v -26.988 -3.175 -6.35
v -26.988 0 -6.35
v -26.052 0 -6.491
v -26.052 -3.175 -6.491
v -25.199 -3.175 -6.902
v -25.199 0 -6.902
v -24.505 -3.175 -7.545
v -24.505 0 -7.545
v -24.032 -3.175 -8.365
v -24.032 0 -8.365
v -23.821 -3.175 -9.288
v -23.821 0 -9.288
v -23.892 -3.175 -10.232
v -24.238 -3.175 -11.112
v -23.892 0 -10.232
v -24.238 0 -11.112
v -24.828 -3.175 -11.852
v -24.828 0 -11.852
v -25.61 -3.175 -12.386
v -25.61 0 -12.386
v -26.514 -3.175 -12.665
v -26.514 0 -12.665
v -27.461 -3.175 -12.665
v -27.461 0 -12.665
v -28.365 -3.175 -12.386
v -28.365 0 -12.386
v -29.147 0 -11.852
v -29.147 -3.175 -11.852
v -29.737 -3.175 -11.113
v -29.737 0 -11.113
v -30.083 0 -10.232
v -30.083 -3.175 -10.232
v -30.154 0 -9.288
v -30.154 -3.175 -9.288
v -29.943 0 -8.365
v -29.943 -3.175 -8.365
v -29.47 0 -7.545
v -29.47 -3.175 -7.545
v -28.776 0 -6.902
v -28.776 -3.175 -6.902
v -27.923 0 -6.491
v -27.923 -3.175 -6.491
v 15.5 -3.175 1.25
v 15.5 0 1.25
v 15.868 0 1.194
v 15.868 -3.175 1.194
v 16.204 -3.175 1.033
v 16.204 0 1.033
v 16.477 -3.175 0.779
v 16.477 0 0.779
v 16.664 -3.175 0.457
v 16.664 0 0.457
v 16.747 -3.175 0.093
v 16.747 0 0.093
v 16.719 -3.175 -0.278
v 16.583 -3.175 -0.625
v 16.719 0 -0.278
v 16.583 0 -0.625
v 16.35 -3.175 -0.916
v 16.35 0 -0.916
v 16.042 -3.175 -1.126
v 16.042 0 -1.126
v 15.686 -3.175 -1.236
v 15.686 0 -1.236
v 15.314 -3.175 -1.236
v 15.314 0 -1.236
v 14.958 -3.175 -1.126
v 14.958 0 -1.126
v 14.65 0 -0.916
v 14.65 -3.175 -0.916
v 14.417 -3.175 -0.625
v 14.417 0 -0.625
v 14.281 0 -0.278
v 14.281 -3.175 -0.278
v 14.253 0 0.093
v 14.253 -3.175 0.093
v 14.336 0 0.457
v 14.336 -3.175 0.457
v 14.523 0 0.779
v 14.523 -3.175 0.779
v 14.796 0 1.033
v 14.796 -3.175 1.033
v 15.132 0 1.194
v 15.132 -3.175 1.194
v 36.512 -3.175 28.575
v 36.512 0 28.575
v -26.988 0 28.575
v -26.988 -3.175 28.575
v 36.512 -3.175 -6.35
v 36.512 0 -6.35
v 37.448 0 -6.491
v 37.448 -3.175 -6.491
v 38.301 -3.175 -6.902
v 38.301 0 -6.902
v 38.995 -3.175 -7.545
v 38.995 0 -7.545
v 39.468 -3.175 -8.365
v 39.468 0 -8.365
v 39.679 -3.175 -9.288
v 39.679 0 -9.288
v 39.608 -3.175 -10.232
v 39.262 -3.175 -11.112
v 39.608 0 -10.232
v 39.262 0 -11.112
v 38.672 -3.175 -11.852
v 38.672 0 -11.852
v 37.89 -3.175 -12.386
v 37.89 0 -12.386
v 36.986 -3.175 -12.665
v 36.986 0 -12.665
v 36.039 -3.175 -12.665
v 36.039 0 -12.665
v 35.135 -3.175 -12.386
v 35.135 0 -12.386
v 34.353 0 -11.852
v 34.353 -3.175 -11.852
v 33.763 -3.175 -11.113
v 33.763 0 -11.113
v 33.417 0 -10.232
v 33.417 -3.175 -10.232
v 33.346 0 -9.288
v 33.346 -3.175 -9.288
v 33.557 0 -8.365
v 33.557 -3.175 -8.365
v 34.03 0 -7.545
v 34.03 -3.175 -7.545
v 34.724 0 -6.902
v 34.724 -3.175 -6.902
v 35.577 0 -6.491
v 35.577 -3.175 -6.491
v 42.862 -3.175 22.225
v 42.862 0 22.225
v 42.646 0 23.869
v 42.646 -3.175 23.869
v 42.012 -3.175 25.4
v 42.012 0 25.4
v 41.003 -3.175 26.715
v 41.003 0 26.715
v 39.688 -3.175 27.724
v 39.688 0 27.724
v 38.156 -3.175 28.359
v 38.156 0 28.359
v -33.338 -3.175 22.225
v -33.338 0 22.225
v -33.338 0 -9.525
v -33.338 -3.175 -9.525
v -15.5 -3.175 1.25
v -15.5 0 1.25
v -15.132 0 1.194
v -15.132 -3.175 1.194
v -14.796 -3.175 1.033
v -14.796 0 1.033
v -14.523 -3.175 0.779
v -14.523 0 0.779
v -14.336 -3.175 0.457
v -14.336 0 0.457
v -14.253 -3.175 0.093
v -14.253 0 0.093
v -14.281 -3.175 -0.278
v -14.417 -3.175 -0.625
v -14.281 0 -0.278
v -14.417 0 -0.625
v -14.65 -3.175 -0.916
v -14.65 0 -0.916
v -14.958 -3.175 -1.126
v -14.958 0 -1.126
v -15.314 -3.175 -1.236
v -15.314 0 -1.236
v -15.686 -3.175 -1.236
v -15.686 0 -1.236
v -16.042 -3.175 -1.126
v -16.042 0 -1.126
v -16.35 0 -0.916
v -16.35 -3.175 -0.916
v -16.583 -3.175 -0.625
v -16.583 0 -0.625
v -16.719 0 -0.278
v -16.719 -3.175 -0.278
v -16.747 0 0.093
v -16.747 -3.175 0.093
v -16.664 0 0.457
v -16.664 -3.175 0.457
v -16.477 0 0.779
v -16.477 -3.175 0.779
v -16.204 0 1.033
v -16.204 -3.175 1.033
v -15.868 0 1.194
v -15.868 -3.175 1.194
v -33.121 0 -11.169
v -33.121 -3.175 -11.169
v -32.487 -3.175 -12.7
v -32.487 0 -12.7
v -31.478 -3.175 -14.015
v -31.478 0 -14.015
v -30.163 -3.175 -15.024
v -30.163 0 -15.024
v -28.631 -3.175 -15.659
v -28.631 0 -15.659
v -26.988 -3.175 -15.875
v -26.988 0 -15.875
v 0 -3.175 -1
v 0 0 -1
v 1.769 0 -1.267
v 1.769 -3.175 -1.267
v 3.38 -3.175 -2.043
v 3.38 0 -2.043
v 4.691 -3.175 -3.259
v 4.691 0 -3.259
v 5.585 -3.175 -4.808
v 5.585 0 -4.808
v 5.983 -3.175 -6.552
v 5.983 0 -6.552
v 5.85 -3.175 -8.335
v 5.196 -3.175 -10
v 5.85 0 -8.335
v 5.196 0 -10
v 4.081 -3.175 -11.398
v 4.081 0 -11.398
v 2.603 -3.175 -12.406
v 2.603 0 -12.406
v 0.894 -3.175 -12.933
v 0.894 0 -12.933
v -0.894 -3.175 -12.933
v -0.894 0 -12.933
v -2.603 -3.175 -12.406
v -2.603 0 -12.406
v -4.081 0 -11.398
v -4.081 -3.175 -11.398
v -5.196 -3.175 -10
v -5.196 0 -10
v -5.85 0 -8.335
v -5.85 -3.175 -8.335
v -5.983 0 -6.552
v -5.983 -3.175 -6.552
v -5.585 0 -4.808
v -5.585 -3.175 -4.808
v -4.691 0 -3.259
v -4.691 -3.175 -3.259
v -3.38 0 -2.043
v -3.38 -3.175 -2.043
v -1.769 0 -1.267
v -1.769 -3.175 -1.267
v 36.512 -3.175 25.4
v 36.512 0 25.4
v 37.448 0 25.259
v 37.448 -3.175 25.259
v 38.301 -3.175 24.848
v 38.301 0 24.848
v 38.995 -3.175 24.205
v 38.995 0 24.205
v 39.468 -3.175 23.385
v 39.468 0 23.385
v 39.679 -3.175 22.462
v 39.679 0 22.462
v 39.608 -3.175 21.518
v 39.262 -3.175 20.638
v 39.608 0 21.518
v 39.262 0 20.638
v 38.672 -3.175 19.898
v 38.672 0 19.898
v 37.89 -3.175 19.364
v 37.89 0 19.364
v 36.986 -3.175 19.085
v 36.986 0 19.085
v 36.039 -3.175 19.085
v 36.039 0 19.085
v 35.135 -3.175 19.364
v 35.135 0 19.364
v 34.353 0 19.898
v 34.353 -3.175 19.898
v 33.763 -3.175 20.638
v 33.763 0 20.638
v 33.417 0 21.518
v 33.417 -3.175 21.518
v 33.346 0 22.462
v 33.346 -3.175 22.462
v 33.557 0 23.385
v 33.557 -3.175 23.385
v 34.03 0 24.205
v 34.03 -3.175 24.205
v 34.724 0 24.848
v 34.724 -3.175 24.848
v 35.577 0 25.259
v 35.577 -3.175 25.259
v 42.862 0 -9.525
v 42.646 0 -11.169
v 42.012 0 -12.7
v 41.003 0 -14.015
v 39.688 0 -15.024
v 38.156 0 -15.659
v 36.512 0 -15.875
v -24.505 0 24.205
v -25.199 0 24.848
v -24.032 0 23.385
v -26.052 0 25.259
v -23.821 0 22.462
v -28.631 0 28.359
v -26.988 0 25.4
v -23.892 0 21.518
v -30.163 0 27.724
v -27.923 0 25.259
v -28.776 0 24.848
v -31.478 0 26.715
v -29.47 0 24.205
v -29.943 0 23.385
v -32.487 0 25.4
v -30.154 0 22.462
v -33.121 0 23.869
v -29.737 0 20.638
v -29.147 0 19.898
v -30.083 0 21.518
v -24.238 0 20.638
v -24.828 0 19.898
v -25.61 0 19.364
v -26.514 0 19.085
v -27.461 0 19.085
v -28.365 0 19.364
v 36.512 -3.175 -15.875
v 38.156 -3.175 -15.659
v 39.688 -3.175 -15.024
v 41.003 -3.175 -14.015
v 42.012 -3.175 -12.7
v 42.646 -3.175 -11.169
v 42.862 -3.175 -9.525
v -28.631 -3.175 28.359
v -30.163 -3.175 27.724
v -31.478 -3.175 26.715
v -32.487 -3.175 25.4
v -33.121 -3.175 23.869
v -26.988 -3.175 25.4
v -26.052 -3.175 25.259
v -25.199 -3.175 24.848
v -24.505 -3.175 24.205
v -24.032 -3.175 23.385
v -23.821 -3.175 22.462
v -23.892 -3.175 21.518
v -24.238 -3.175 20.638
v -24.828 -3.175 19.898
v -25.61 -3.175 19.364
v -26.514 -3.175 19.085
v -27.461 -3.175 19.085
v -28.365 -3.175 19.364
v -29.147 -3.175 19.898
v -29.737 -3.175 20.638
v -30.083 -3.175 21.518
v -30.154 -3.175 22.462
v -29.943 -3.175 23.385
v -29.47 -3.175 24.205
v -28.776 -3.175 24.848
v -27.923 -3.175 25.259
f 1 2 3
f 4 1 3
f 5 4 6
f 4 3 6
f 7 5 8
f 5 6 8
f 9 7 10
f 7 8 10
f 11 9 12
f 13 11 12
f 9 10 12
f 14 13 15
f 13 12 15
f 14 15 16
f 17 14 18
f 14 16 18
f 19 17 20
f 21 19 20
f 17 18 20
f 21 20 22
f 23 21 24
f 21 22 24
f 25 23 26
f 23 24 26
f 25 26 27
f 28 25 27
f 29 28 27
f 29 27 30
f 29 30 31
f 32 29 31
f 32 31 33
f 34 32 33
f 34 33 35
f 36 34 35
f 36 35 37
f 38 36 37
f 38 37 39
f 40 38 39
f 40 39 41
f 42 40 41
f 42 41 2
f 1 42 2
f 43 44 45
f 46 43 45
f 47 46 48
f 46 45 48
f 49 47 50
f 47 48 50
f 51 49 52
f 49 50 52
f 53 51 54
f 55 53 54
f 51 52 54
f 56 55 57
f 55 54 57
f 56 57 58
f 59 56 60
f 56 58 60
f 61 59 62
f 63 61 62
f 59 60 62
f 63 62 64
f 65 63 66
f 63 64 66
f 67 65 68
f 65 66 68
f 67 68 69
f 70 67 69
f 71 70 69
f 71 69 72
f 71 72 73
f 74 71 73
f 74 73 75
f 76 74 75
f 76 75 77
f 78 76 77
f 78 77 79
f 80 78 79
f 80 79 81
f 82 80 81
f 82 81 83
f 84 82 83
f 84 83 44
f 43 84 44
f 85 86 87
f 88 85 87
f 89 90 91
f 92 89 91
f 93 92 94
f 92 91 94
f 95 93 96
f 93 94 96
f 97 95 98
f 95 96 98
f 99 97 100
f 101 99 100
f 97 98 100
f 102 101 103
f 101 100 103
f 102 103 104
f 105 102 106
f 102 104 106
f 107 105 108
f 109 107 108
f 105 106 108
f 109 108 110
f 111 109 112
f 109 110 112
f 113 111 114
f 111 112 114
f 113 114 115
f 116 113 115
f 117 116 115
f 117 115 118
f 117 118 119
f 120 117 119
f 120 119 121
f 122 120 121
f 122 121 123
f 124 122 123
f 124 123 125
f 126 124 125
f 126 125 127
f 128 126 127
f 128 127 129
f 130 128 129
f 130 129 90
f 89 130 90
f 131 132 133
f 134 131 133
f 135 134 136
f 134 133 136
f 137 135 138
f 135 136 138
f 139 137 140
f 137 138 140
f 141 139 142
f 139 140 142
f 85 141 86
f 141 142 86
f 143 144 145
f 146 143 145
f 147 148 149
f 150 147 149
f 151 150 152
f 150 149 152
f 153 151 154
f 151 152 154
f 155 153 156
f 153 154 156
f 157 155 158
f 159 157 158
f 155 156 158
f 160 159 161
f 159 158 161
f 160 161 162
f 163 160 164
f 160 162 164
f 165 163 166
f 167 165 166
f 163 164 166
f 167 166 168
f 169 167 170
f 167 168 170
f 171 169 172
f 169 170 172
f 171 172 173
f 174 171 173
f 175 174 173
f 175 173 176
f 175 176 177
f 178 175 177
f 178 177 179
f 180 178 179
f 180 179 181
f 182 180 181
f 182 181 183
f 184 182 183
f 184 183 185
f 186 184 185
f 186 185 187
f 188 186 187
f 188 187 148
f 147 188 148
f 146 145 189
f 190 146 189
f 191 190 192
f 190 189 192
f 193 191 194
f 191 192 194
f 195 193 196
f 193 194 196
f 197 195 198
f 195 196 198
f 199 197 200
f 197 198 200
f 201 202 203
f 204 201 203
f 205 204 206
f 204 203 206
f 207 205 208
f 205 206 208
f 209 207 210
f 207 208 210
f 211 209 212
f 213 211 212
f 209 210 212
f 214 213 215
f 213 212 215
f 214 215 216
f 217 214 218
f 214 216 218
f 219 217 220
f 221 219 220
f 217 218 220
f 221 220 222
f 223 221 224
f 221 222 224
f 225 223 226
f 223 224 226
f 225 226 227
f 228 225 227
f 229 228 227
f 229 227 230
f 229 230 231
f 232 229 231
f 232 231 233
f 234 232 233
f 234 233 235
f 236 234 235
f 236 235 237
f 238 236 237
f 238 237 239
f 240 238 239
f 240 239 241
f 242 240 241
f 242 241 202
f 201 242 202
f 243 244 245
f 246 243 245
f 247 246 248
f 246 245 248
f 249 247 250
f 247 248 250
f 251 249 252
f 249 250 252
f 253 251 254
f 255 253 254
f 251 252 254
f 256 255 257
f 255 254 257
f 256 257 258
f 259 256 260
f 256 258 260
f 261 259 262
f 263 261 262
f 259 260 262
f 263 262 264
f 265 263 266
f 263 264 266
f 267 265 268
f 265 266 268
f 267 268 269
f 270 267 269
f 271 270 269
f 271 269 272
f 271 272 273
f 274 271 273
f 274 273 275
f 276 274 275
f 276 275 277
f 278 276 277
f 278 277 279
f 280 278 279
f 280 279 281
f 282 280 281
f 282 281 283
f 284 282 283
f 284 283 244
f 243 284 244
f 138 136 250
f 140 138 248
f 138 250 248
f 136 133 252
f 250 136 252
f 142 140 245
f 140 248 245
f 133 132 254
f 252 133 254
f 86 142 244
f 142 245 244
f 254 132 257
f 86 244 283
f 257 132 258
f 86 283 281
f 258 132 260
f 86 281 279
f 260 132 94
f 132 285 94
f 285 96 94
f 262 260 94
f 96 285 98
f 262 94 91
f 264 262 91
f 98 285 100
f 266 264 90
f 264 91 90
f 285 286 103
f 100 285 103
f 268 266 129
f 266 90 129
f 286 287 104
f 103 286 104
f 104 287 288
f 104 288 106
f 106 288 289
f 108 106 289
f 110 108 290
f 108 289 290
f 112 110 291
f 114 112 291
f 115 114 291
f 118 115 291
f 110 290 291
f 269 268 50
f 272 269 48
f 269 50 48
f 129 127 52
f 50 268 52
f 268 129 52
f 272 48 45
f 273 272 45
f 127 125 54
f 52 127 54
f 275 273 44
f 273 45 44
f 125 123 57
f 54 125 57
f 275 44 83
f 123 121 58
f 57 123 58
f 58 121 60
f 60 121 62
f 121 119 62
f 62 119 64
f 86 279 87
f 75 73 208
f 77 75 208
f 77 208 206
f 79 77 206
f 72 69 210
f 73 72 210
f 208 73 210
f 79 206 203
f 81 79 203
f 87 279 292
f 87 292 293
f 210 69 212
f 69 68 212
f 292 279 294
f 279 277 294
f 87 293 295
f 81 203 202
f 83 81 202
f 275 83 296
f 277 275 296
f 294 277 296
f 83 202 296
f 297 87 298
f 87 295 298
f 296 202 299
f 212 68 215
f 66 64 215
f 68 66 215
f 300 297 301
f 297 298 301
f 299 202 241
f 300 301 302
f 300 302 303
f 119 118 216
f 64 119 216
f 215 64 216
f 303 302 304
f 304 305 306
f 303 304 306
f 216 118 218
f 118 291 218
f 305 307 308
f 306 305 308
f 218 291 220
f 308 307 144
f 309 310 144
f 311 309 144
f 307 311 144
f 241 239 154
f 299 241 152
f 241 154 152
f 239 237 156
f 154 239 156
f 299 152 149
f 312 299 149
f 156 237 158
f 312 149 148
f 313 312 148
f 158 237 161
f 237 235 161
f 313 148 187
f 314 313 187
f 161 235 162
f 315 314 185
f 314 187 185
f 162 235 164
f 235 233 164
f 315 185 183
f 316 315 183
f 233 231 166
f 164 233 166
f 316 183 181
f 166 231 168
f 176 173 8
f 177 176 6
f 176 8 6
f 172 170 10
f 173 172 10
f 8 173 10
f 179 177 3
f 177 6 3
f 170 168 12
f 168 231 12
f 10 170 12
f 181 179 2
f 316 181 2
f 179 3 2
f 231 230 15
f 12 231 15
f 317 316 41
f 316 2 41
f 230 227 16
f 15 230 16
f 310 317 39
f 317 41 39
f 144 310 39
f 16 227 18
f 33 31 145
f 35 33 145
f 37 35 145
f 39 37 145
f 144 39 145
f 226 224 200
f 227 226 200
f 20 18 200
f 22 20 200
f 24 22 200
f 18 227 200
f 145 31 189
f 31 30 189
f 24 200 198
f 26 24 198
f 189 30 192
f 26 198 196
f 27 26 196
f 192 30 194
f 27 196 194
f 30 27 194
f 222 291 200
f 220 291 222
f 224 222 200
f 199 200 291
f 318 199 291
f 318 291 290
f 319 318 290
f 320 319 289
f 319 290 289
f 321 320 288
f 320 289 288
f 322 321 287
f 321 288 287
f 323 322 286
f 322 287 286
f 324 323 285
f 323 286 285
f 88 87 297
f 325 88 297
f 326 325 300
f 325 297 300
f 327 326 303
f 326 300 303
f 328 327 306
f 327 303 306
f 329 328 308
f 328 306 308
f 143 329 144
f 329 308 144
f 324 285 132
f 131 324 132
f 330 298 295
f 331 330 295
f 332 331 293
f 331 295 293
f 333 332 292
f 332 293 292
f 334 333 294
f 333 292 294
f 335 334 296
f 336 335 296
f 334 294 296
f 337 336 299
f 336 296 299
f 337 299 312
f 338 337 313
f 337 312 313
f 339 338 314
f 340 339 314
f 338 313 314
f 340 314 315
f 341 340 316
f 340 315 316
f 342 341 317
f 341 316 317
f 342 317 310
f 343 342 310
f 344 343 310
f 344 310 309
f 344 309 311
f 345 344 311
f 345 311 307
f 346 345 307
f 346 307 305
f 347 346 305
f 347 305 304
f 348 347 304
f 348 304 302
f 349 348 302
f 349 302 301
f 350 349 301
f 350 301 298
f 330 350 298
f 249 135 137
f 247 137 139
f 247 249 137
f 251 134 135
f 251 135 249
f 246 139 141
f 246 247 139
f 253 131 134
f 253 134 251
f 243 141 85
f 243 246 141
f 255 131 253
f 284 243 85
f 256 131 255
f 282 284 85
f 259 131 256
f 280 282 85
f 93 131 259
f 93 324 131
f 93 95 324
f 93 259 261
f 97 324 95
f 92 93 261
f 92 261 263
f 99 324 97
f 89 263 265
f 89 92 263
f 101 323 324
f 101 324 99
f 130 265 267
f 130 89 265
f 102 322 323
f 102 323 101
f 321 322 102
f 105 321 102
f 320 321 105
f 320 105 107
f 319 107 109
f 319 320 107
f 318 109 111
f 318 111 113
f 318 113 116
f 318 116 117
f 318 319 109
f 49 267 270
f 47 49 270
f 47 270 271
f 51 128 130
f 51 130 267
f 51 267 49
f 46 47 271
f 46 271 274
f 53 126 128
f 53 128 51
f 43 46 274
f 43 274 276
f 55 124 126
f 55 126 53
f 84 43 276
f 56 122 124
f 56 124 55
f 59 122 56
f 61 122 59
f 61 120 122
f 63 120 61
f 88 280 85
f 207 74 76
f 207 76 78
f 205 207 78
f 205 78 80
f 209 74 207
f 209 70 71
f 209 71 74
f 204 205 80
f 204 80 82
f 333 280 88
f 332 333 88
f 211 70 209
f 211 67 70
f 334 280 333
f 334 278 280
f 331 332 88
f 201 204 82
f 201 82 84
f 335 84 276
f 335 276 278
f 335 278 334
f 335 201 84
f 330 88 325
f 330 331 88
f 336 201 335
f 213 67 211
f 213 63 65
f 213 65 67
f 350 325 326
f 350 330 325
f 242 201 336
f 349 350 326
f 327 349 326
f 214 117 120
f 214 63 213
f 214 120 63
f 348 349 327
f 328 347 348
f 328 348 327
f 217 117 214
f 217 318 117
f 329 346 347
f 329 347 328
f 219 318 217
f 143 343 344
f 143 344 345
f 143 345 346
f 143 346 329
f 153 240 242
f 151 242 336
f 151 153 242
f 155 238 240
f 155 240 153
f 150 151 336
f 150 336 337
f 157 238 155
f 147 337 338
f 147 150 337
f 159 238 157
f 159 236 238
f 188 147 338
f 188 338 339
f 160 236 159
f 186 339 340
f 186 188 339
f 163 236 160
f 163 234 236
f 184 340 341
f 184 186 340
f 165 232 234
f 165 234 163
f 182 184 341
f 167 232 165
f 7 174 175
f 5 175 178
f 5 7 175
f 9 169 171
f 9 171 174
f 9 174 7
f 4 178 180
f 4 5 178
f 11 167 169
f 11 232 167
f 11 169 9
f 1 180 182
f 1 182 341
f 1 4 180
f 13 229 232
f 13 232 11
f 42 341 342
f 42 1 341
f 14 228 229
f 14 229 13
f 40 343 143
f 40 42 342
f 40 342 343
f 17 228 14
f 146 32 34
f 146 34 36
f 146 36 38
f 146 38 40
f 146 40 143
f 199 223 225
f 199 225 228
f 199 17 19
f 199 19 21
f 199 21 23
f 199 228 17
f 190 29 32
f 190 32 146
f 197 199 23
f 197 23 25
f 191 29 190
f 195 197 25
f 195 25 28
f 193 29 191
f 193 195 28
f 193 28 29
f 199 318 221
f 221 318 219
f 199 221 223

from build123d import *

# Parameters (mm, degrees)
BASE_FLANGE1_DEPTH = 3.175
SKETCH6_R          = 3.175
SKETCH6_R_2        = 6
SKETCH6_R_3        = 1.25
CUT_EXTRUDE1_DEPTH = 52.612064057


# Sheet-metal steps are written as plain solids
with BuildPart() as part:
    # Sketch1 → Base-Flange1 (new body)
    with BuildSketch(Plane(origin=(0, 0, 0), x_dir=(1, 0, 0), z_dir=(0, 1, 0))):
        with BuildLine():
            Line((36.5125, -28.575), (-26.9875, -28.575))
            ThreePointArc((-26.9875, -28.575), (-31.477628061, -26.715128061), (-33.3375, -22.225))
            Line((-33.3375, -22.225), (-33.3375, 9.525))
            ThreePointArc((-33.3375, 9.525), (-31.477628061, 14.015128061), (-26.9875, 15.875))
            Line((-26.9875, 15.875), (36.5125, 15.875))
            ThreePointArc((36.5125, 15.875), (41.002628061, 14.015128061), (42.8625, 9.525))
            Line((42.8625, 9.525), (42.8625, -22.225))
            ThreePointArc((42.8625, -22.225), (41.002628061, -26.715128061), (36.5125, -28.575))
        make_face()
    extrude(amount=-BASE_FLANGE1_DEPTH)

    # Sketch6 → Cut-Extrude1 (cut, through all)
    with BuildSketch(Plane(origin=(0, 0, 0), x_dir=(1, 0, 0), z_dir=(0, 1, 0))):
        with Locations(Location((-26.9875, 9.525, 0), (0, 0, 270))):
            Circle(SKETCH6_R)
        with Locations(Location((-26.9875, -22.225, 0), (0, 0, 270))):
            Circle(SKETCH6_R)
        with Locations(Location((36.5125, 9.525, 0), (0, 0, 270))):
            Circle(SKETCH6_R)
        with Locations(Location((36.5125, -22.225, 0), (0, 0, 270))):
            Circle(SKETCH6_R)
        with Locations(Location((0, 7, 0), (0, 0, 270))):
            Circle(SKETCH6_R_2)
        with Locations(Location((-15.5, 0, 0), (0, 0, 270))):
            Circle(SKETCH6_R_3)
        with Locations(Location((15.5, 0, 0), (0, 0, 270))):
            Circle(SKETCH6_R_3)
    extrude(amount=-CUT_EXTRUDE1_DEPTH, mode=Mode.SUBTRACT)


solid = part.part
